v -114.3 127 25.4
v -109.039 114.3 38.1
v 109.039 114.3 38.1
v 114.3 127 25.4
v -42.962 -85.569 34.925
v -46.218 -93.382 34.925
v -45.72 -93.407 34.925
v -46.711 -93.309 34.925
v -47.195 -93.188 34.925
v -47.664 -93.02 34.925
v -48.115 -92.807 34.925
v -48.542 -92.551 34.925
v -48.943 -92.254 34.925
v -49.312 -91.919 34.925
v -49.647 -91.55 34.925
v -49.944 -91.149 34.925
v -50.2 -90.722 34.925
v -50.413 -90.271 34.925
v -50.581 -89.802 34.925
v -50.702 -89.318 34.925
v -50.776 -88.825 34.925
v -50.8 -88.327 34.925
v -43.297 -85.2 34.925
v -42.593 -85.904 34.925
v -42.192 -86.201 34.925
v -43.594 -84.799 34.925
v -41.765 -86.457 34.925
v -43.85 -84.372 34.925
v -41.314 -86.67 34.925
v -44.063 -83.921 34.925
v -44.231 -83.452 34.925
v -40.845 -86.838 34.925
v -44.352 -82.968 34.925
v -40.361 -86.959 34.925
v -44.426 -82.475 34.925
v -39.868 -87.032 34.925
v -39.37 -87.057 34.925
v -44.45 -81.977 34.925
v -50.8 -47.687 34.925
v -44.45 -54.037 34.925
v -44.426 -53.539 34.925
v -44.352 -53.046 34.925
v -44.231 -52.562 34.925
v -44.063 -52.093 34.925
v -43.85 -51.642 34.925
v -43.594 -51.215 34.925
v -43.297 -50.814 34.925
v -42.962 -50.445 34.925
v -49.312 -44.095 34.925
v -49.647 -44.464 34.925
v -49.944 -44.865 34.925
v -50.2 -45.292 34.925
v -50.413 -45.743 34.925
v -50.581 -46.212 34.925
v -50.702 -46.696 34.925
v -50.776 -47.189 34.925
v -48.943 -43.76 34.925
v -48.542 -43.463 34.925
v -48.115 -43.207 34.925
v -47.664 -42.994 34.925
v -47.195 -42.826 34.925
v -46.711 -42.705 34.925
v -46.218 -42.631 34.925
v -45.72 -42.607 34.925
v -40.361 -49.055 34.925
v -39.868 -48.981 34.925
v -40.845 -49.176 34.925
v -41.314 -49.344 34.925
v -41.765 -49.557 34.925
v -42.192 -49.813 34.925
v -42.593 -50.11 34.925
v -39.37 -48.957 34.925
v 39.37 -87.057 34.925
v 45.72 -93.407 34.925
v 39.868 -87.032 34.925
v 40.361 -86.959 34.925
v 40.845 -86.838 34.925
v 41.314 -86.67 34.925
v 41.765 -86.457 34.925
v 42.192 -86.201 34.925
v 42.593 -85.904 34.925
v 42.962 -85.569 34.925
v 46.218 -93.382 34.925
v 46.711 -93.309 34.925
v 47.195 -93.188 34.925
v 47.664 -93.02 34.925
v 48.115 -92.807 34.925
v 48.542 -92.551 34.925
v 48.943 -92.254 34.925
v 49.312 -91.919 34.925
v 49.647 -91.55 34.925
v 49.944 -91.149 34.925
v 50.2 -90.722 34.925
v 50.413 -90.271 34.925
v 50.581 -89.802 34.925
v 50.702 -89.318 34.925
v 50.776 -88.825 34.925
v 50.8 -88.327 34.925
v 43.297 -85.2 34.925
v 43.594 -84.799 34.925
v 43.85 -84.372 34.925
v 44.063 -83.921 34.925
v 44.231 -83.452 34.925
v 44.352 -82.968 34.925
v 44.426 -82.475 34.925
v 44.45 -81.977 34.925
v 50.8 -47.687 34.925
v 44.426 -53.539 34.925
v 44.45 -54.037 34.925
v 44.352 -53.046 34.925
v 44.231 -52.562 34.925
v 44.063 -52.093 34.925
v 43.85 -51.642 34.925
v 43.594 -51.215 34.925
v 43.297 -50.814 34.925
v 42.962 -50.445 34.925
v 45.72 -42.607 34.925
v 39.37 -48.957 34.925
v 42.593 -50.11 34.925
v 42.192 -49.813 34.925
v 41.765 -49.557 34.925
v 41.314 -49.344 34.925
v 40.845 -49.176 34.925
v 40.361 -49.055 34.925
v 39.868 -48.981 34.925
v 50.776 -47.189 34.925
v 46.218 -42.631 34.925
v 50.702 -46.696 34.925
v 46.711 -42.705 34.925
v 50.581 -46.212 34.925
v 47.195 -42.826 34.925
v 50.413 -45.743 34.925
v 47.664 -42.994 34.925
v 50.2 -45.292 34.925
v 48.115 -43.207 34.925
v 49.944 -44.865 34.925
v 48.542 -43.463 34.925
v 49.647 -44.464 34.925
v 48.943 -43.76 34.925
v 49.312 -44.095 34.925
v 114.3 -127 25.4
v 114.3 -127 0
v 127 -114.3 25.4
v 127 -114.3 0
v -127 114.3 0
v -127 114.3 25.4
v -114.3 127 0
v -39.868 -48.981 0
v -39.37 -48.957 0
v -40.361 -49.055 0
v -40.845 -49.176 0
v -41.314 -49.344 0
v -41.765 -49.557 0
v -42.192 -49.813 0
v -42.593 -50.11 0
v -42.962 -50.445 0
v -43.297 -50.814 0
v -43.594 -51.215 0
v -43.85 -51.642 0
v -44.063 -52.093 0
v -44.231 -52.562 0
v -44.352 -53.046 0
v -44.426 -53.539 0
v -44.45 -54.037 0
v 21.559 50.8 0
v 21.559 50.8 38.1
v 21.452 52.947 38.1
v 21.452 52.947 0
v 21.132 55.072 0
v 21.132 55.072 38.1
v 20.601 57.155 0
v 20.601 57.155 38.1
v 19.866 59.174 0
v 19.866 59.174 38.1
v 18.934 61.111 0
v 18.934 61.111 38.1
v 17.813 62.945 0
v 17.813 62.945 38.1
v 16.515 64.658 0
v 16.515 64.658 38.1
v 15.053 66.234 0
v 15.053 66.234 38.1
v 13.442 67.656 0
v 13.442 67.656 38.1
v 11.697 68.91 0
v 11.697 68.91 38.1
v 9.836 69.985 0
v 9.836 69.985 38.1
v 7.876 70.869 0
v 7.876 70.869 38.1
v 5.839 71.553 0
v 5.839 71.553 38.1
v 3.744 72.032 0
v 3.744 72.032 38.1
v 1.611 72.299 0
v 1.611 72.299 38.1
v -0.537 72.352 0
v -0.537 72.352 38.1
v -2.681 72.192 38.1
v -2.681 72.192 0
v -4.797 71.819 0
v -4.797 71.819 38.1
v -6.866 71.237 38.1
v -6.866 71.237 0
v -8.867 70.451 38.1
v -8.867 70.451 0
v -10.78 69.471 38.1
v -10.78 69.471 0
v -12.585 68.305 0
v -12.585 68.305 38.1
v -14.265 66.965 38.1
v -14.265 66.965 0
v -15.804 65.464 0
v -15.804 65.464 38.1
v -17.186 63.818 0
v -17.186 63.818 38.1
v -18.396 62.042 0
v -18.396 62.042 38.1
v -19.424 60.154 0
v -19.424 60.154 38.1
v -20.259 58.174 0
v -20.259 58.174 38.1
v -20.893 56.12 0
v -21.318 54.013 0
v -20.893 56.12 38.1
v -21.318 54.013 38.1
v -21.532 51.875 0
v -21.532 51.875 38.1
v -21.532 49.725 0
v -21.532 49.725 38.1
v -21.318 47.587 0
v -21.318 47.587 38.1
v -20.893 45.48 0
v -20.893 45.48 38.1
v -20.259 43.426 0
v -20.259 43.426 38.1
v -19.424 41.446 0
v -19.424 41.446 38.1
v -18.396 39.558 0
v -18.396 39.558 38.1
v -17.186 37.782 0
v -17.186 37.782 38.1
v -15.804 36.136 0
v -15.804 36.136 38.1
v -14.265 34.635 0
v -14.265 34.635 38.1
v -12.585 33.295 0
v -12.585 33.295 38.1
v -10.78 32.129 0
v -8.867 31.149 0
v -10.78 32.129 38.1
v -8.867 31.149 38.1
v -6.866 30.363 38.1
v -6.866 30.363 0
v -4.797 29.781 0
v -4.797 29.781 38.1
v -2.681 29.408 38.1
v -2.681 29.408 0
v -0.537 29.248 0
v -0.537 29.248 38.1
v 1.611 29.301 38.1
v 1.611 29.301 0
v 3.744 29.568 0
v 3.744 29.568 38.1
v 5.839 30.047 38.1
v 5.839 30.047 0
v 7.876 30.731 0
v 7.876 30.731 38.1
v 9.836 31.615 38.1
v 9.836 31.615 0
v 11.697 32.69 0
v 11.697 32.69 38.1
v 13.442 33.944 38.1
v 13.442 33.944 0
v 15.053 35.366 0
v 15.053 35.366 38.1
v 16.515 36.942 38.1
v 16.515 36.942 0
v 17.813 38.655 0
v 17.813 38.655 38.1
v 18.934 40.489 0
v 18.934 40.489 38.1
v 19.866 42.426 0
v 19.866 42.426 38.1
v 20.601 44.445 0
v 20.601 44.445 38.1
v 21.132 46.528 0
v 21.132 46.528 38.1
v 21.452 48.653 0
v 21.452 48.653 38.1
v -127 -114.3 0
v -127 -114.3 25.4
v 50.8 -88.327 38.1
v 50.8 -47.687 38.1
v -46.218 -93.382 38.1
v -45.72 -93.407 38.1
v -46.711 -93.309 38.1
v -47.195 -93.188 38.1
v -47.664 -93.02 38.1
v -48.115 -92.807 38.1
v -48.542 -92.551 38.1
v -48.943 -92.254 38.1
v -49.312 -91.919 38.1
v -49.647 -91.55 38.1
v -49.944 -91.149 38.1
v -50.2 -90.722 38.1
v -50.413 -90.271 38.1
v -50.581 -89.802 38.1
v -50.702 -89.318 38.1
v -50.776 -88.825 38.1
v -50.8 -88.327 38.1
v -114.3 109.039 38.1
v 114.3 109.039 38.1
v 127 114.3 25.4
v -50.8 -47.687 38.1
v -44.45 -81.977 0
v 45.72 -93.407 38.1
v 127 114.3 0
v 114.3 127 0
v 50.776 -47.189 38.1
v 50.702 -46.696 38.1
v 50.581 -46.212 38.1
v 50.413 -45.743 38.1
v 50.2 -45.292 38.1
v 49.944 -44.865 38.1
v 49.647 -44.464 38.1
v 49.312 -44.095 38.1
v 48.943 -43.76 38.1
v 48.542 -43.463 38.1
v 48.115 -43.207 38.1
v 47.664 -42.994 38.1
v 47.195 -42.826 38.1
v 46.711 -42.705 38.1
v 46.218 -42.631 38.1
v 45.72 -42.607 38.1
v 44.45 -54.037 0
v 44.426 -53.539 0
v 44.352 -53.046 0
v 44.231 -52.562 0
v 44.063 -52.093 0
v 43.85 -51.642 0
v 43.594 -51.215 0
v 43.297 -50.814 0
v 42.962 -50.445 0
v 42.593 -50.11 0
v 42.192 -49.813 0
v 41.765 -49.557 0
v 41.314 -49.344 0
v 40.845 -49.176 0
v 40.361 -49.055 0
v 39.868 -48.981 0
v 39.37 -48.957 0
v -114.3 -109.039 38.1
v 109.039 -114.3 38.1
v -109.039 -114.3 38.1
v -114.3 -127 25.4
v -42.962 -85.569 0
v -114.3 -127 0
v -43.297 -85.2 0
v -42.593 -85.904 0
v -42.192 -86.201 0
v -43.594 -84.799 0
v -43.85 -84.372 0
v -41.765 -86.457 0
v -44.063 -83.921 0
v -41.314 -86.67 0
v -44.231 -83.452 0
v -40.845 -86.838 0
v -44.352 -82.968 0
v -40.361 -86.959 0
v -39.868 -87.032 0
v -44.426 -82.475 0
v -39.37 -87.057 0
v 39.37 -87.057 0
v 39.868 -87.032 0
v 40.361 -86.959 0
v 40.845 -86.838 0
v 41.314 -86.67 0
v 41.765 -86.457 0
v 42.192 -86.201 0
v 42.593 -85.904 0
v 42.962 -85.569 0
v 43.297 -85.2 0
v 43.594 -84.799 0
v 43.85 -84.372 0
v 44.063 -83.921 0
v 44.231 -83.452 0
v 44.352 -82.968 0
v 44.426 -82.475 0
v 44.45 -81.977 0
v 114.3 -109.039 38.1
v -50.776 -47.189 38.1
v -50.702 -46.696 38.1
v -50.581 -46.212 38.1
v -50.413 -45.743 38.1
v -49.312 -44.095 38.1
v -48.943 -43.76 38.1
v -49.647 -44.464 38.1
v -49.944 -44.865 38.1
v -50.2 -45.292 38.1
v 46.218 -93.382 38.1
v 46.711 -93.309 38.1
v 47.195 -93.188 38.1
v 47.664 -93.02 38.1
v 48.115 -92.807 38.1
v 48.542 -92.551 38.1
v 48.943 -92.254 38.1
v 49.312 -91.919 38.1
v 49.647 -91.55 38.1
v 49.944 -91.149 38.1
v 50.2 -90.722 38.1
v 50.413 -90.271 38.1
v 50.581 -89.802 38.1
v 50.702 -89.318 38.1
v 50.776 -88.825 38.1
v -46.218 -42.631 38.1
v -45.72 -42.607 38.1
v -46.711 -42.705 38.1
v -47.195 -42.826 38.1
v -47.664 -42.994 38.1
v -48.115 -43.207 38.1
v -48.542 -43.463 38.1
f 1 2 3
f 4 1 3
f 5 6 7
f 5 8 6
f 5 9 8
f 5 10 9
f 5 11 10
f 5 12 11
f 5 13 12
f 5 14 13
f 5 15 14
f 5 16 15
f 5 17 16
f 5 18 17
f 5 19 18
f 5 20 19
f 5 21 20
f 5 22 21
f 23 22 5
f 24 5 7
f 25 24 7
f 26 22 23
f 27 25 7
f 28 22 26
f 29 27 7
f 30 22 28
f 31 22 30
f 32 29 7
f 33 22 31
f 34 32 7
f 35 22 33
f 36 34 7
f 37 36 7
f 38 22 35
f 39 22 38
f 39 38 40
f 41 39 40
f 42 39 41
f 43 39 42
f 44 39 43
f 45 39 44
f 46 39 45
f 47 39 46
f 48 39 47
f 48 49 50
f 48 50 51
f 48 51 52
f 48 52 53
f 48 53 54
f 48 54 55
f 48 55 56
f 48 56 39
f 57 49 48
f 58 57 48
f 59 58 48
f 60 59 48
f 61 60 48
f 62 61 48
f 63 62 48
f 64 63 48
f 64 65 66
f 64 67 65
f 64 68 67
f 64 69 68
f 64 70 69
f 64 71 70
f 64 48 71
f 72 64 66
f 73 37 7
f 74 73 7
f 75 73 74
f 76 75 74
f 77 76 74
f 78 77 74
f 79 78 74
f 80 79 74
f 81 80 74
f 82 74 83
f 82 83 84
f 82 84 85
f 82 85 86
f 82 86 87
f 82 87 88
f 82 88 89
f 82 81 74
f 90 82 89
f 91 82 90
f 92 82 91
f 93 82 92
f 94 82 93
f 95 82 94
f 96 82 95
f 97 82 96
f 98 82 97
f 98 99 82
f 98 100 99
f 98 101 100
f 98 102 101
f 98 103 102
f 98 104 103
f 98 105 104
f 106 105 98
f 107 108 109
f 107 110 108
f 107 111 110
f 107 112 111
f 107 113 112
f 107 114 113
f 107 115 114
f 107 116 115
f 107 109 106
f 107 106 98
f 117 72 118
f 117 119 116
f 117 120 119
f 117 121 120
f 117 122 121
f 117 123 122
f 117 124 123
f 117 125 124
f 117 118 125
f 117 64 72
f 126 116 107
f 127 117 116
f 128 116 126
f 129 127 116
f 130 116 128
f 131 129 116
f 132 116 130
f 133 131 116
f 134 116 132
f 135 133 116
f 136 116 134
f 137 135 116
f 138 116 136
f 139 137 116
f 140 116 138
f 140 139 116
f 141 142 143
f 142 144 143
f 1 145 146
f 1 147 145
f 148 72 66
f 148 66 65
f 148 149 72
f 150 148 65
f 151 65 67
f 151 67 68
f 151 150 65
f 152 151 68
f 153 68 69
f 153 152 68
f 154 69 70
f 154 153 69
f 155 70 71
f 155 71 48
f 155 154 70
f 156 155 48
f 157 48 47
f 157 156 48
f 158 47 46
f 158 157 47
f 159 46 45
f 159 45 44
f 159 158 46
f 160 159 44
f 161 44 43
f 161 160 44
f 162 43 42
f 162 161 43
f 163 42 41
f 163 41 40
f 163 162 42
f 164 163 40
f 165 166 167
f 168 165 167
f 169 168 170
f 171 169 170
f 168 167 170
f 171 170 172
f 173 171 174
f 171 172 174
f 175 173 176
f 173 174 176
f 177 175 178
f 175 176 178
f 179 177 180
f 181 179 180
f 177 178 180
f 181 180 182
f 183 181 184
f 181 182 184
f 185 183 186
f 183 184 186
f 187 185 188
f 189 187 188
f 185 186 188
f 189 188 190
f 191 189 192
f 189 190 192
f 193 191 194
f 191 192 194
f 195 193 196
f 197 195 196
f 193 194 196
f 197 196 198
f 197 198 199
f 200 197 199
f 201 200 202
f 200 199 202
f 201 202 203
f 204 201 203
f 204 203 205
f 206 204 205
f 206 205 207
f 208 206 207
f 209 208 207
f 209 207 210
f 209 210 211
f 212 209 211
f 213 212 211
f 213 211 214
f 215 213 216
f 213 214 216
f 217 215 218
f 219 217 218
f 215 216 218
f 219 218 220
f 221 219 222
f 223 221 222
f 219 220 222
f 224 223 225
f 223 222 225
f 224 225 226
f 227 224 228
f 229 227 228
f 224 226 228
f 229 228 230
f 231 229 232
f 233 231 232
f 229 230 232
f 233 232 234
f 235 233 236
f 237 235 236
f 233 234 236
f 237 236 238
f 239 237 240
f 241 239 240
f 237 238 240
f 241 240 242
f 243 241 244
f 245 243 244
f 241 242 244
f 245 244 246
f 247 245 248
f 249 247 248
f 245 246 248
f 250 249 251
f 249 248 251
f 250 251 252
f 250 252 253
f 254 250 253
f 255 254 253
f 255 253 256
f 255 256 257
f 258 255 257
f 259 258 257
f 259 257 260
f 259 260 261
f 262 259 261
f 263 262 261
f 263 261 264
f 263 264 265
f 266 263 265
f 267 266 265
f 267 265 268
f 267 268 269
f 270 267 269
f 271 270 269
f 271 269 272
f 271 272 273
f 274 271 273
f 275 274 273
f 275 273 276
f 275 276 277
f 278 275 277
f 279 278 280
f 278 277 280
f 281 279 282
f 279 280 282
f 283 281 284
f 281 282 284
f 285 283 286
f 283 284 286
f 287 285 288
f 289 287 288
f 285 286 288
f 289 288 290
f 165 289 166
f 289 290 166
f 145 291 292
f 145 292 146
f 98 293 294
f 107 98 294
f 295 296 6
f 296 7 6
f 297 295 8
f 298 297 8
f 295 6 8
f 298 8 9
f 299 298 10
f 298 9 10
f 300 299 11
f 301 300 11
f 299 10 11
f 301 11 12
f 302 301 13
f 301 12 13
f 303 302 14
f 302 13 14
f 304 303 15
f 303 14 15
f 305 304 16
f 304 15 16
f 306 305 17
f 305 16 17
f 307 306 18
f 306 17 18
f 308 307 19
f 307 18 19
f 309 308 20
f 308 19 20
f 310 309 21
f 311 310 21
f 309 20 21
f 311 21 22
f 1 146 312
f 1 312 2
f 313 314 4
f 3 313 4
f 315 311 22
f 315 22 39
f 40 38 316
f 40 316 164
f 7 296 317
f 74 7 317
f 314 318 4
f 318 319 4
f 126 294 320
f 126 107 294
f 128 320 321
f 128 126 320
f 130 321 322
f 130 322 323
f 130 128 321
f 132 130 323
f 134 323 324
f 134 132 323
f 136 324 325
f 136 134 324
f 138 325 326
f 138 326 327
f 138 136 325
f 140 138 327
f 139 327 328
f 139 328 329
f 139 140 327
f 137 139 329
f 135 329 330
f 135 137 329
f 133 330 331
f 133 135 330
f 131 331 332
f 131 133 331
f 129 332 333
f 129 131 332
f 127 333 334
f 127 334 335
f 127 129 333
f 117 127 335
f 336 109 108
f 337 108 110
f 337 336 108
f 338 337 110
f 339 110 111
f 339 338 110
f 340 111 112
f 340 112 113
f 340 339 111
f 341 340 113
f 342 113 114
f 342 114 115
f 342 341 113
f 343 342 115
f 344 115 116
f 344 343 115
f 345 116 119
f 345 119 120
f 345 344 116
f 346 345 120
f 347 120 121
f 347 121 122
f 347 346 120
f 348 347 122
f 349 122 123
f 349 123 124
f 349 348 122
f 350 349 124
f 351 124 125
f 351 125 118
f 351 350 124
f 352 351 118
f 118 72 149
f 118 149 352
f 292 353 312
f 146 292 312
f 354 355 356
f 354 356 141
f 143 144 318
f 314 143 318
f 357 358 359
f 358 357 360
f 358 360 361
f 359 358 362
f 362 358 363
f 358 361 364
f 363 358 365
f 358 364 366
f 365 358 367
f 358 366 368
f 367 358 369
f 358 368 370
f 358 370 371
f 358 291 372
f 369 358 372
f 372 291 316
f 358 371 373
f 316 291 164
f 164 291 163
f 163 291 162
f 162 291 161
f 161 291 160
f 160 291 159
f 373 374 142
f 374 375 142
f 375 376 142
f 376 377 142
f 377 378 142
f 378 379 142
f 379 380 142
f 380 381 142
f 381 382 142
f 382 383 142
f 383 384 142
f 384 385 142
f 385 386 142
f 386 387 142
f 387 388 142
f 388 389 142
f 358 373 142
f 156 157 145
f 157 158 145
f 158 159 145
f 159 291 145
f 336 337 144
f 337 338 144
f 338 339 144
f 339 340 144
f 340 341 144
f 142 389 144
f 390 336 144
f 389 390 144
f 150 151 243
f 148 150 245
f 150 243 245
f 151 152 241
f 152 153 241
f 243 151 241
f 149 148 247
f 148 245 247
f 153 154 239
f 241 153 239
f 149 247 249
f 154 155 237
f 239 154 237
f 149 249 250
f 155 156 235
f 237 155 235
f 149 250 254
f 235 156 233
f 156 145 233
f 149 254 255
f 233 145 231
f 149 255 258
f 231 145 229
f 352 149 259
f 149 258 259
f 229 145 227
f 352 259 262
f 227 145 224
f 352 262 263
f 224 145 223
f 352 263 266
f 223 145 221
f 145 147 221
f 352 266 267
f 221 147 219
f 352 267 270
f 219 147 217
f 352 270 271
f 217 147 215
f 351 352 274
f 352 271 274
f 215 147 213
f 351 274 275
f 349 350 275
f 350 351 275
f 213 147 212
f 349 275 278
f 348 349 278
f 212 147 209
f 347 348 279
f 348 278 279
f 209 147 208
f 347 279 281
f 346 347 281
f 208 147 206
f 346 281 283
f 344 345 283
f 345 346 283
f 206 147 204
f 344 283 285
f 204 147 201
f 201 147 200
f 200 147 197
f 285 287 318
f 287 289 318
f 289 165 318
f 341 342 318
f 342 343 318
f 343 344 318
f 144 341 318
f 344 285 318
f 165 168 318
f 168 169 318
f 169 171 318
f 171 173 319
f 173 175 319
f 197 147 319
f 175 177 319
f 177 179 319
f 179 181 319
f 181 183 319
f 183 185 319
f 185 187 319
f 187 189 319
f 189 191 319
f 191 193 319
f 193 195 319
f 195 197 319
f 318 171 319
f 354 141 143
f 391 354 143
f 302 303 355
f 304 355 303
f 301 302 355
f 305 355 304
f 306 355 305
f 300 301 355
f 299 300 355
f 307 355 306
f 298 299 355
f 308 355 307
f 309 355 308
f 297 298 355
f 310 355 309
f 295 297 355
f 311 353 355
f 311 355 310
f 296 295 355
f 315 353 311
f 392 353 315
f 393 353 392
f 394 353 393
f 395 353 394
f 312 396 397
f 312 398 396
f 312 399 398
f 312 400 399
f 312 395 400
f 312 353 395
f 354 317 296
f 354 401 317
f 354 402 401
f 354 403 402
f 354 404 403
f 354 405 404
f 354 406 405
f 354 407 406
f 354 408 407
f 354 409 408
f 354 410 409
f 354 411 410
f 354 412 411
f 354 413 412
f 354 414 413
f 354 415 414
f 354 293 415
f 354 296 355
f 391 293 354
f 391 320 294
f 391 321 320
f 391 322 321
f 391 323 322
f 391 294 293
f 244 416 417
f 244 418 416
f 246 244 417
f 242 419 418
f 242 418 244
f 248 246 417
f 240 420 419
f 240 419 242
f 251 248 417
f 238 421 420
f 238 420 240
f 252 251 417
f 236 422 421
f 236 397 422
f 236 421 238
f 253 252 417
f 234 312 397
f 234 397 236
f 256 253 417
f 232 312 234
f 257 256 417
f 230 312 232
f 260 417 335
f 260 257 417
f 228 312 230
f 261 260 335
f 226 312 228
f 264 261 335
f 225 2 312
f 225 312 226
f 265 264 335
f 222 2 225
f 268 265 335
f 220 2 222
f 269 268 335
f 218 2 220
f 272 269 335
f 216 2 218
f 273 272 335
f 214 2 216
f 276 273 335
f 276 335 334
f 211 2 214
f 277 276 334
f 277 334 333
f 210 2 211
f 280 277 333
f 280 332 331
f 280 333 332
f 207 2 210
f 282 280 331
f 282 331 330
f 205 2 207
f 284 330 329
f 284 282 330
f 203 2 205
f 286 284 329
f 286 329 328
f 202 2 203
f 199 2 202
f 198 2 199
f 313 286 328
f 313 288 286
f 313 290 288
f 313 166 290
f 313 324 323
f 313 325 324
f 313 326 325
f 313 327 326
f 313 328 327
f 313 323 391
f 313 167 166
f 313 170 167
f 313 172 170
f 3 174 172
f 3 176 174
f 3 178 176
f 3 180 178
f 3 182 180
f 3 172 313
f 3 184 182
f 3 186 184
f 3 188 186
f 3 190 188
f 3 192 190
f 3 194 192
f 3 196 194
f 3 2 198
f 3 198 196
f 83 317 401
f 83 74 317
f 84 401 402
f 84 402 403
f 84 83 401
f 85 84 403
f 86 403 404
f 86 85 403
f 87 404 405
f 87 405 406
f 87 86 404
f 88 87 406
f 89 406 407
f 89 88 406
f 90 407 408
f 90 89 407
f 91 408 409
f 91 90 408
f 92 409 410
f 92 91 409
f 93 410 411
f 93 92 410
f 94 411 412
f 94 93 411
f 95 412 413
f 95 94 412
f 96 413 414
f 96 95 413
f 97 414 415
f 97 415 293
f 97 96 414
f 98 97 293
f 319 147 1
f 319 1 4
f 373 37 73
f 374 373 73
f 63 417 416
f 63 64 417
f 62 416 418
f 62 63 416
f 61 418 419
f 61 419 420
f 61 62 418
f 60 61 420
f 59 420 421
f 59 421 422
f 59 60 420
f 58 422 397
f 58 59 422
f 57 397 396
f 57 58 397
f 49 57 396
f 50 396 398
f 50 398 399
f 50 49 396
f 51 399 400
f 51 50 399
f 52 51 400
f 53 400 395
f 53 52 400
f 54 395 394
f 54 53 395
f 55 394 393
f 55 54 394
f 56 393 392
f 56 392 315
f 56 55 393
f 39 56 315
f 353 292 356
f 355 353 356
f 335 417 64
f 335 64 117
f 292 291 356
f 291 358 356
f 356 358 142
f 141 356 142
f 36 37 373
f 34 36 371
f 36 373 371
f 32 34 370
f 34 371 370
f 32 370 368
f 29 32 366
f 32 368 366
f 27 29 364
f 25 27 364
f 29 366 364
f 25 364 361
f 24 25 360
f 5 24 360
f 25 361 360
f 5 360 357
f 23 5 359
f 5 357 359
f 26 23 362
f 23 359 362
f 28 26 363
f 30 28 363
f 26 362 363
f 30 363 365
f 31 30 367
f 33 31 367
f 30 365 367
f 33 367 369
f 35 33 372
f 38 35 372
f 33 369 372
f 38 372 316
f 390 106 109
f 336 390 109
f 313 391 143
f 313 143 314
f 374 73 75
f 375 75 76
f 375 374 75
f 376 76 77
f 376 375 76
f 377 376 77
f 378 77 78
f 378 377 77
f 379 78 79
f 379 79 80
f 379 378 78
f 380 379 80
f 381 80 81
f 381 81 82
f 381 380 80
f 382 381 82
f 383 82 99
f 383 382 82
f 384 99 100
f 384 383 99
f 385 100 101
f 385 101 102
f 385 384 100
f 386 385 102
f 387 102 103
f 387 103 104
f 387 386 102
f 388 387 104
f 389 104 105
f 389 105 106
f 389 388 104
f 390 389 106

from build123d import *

# Parameters (mm, degrees)
F0_W     = 254
F0_H     = 254
F1_DEPTH = 38.1
F2_SIZE  = 12.7
F3_R     = 21.5591889527
F4_DEPTH = 38.1
F5_W     = 101.6
F5_H     = 50.8
F6_DEPTH = 3.175
F7_W     = 88.9000004845
F7_H     = 38.1000004845
F8_DEPTH = 38.101
F9_R     = 5.08
F10_SIZE = 12.7


with BuildPart() as f1:
    # F0 (on Top) → F1 (new body)
    with BuildSketch(Plane.XY):
        Rectangle(F0_W, F0_H)
    extrude(amount=F1_DEPTH)

    # F2
    f2_edges = [f1.edges().sort_by_distance(p)[0] for p in [
        (-127, -127, 19.05),
        (127, -127, 19.05),
        (-127, 127, 19.05),
        (127, 127, 19.05),
    ]]
    chamfer(f2_edges, length=F2_SIZE)

    # F3 (on face) → F4 (cut, through all)
    with BuildSketch(Plane.XY.offset(38.1)):
        with Locations((0, 50.8)):
            Circle(F3_R)
    extrude(amount=-F4_DEPTH, mode=Mode.SUBTRACT)

    # F5 (on face) → F6 (cut)
    with BuildSketch(Plane.XY.offset(38.1)):
        with Locations((0, -68.0069606819)):
            Rectangle(F5_W, F5_H)
    extrude(amount=-F6_DEPTH, mode=Mode.SUBTRACT)

    # F7 (on face) → F8 (cut, through all)
    with BuildSketch(Plane.XY.offset(38.1)):
        with Locations((0, -68.0069606819)):
            Rectangle(F7_W, F7_H)
    extrude(amount=-F8_DEPTH, mode=Mode.SUBTRACT)

    # F9
    f9_edges = [f1.edges().sort_by_distance(p)[0] for p in [
        (-50.8, -42.606961, 36.5125),
        (-44.45, -48.95696, 17.4625),
        (44.45, -48.95696, 17.4625),
        (50.8, -42.606961, 36.5125),
        (50.8, -93.406961, 36.5125),
        (44.45, -87.056961, 17.4625),
        (-44.45, -87.056961, 17.4625),
        (-50.8, -93.406961, 36.5125),
    ]]
    fillet(f9_edges, radius=F9_R)

    # F10
    f10_edges = [f1.edges().sort_by_distance(p)[0] for p in [
        (0, -127, 38.1),
        (-120.65, -120.65, 38.1),
        (-127, 0, 38.1),
        (-120.65, 120.65, 38.1),
        (0, 127, 38.1),
        (120.65, 120.65, 38.1),
        (120.65, -120.65, 38.1),
        (127, 0, 38.1),
    ]]
    chamfer(f10_edges, length=F10_SIZE)


solid = f1.part
